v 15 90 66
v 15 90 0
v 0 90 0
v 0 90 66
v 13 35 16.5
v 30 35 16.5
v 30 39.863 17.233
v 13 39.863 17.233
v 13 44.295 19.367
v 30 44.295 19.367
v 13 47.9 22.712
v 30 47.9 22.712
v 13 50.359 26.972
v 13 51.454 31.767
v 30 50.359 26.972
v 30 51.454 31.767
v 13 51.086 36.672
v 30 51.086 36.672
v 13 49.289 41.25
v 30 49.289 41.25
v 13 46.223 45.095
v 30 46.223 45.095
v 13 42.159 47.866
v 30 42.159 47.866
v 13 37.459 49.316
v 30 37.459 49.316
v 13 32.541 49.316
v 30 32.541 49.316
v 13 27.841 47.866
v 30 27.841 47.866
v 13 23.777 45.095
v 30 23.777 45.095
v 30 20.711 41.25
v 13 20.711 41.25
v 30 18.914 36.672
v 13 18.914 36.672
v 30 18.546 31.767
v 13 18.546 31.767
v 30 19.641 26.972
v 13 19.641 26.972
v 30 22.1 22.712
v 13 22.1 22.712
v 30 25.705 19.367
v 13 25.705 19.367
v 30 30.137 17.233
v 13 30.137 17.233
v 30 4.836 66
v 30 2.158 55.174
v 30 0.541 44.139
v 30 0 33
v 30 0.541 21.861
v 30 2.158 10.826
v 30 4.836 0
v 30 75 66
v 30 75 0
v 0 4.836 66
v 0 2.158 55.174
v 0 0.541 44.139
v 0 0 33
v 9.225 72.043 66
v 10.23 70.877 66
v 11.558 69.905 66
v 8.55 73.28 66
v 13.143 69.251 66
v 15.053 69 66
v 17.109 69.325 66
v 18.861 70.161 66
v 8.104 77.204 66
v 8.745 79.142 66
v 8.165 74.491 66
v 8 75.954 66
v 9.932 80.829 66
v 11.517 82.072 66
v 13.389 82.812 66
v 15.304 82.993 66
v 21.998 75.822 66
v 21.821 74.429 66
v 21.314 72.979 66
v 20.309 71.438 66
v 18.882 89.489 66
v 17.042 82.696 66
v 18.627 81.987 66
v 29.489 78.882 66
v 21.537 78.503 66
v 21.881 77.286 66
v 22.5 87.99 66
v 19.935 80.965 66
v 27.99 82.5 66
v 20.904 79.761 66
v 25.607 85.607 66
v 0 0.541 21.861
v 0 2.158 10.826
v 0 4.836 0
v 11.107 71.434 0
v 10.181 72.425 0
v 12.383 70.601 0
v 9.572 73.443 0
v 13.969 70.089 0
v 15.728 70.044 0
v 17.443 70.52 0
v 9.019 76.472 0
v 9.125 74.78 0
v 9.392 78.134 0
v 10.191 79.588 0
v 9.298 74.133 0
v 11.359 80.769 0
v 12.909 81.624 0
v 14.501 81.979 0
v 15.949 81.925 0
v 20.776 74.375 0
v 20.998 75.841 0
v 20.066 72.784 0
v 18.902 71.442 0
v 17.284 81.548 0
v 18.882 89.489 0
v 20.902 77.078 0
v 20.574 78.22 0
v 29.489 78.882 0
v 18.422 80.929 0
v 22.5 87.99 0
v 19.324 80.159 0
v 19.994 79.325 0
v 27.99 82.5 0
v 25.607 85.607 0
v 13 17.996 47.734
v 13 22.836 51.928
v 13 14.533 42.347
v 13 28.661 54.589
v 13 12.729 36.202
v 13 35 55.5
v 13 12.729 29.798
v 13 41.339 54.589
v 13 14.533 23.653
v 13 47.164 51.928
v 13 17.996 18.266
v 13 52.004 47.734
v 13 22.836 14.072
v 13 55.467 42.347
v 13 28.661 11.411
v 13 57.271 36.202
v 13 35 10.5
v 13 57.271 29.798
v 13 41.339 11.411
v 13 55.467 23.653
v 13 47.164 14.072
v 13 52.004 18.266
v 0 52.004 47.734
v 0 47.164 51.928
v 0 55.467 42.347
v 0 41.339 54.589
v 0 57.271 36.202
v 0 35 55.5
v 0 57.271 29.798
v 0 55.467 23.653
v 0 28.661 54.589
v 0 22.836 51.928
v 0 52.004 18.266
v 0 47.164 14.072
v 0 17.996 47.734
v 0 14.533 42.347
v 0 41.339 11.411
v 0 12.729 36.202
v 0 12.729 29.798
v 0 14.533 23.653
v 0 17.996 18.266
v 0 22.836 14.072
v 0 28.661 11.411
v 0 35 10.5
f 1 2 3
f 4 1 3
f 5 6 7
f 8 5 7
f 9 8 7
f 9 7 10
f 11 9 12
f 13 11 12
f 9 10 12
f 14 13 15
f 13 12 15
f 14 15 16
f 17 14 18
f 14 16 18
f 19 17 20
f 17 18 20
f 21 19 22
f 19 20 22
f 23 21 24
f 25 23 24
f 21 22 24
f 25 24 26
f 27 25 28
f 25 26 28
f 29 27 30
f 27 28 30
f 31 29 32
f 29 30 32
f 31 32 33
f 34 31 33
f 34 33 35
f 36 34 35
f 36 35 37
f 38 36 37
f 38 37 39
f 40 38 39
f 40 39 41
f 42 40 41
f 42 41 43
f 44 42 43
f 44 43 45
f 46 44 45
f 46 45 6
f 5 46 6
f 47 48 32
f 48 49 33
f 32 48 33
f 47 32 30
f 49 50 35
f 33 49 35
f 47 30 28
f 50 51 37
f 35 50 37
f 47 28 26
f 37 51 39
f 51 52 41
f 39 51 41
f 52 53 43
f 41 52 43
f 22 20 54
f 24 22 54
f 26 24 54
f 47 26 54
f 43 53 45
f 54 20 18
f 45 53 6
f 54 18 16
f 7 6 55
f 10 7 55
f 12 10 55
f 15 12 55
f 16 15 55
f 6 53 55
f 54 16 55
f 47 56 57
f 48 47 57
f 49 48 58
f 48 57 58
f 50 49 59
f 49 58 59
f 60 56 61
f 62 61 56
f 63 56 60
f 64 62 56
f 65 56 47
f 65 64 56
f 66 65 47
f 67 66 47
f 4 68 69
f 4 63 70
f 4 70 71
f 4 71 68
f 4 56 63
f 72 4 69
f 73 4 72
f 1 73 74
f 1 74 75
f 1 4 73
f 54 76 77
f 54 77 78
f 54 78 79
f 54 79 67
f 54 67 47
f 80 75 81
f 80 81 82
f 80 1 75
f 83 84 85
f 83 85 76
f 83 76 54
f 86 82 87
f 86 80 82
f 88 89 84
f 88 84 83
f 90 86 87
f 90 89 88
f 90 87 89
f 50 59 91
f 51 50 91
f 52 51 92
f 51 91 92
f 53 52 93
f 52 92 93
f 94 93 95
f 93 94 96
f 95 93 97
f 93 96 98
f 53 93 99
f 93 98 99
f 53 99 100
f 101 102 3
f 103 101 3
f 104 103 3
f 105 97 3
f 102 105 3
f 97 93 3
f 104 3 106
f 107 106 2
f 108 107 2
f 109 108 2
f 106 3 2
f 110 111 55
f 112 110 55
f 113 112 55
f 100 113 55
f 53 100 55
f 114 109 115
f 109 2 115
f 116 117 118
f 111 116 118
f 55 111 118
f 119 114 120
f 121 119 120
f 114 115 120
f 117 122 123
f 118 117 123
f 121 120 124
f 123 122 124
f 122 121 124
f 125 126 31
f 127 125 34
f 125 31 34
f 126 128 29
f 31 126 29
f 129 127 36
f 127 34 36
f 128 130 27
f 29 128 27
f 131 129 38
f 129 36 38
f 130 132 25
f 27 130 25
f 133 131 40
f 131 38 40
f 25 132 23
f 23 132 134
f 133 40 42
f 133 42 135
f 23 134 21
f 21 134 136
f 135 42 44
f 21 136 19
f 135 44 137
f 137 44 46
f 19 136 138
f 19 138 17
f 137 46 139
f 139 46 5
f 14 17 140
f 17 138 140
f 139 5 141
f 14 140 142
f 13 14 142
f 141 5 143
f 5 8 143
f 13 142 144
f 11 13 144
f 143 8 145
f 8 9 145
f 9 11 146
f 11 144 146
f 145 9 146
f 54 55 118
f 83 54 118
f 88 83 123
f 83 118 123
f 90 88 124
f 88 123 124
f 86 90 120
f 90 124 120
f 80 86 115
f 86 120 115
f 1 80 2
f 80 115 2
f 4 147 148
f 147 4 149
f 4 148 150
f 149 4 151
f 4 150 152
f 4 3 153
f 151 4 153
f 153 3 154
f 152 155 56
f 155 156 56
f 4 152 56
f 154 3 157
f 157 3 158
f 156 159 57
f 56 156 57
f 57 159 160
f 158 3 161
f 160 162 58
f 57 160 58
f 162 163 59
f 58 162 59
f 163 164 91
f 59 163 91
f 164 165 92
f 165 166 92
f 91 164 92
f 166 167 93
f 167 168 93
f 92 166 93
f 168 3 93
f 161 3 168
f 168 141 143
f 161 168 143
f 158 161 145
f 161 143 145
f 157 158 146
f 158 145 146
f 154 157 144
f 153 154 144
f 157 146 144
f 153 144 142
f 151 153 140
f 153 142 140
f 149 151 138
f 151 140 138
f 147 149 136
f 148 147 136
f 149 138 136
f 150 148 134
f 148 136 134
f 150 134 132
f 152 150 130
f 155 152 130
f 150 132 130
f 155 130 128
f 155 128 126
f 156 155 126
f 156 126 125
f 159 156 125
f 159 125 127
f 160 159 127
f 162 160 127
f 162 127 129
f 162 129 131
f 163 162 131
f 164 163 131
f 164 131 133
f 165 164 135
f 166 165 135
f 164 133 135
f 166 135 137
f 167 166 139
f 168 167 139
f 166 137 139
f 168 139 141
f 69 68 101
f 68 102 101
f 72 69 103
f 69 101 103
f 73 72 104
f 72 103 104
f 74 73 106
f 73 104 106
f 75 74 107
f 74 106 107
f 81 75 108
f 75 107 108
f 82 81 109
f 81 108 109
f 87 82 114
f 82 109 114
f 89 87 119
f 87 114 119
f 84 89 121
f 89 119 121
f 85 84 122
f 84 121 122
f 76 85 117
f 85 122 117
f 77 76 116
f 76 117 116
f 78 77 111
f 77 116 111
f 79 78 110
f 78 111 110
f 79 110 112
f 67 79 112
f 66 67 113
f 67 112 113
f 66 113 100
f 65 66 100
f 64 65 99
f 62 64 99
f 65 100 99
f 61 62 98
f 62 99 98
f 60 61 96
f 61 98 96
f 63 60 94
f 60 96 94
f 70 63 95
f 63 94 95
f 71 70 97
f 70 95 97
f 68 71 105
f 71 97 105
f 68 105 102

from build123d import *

# Parameters (mm, degrees)
BOSS_EXTRUDE1_DEPTH = 66
CUT_EXTRUDE2_START  = -17
SKETCH3_R           = 22.5
SKETCH3_R_2         = 16.5
CUT_EXTRUDE2_DEPTH  = 13
CUT_EXTRUDE3_REACH  = 117.568
SKETCH3_2_R         = 16.5
CUT_EXTRUDE5_DEPTH  = 116.568161866


with BuildPart() as part:
    # Sketch1 → Boss-Extrude1 (new body)
    with BuildSketch(Plane.XY):
        with BuildLine():
            Line((0, 0), (30, 0))
            Line((30, 0), (30, 75))
            ThreePointArc((30, 75), (25.606601718, 85.606601718), (15, 90))
            Line((15, 90), (0, 90))
            Line((0, 90), (0, 0))
        make_face()
    extrude(amount=BOSS_EXTRUDE1_DEPTH)

    # Sketch3 → Cut-Extrude2 (cut)
    with BuildSketch(Plane(origin=(30, 0, 0), x_dir=(0, 0, -1), z_dir=(1, 0, 0)).offset(CUT_EXTRUDE2_START)):
        with Locations((-33, 35)):
            Circle(SKETCH3_R)
        with Locations((-33, 35)):
            Circle(SKETCH3_R_2, mode=Mode.SUBTRACT)
    extrude(amount=-CUT_EXTRUDE2_DEPTH, mode=Mode.SUBTRACT)

    # Sketch3<2> → Cut-Extrude3 (cut, up to next)
    with BuildSketch(Plane(origin=(30, 0, 0), x_dir=(0, 0, -1), z_dir=(1, 0, 0)), mode=Mode.PRIVATE) as cut_extrude3_sk1:
        with Locations((-33, 35)):
            Circle(SKETCH3_2_R)
    cut_extrude3_tool1 = extrude(cut_extrude3_sk1.sketch, amount=-CUT_EXTRUDE3_REACH, mode=Mode.PRIVATE) & part.part
    add(cut_extrude3_tool1.solids().sort_by_distance((30, 35, 33))[0], mode=Mode.SUBTRACT)

    # Cut-Loft1: read off the stored shape, not the designer's step
    # Cut-Loft1: loft between two sections, ruled curve by curve
    cut_loft1_from = [
        Edge.make_bspline([(8.104234717, 77.203503702, 66), (10.511242121, 90.995034268, 66), (24.302772687, 88.588026864, 66), (21.895765283, 74.796496298, 66), (19.488757879, 61.004965732, 66), (5.697227313, 63.411973136, 66), (8.104234717, 77.203503702, 66)], [0, 0, 0, 0, 0.5, 0.5, 0.5, 1, 1, 1, 1], 3, [1, 0.333333333, 0.333333333, 1, 0.333333333, 0.333333333, 1]),
    ]
    cut_loft1_to = [
        Edge.make_bspline([(9.125428786, 74.779584885, 0), (6.684598557, 86.528727313, 0), (18.433740984, 88.969557543, 0), (20.874571214, 77.220415115, 0), (23.315401443, 65.471272687, 0), (11.566259016, 63.030442457, 0), (9.125428786, 74.779584885, 0)], [0, 0, 0, 0, 0.5, 0.5, 0.5, 1, 1, 1, 1], 3, [1, 0.333333333, 0.333333333, 1, 0.333333333, 0.333333333, 1]),
    ]
    cut_loft1 = Solid(Shell([*[Face.make_surface_from_curves(cut_loft1_from[k], cut_loft1_to[k]) for k in range(1)], Face(Wire(cut_loft1_from)), Face(Wire(cut_loft1_to))]))
    add(cut_loft1, mode=Mode.SUBTRACT)

    # Sketch8 → Cut-Extrude5 (cut, through all)
    with BuildSketch(Plane.ZY):
        with BuildLine():
            ThreePointArc((33.000000237, 0), (16.323732633, 1.215545408), (0, 4.836485169))
            Line((0, 4.836485169), (0, 0))
            Line((0, 0), (33.000000237, 0))
        make_face()
        with BuildLine():
            ThreePointArc((66, 4.836485169), (49.676267601, 1.215545443), (33.000000237, 0))
            Line((33.000000237, 0), (66, 0))
            Line((66, 0), (66, 4.836485169))
        make_face()
    extrude(amount=-CUT_EXTRUDE5_DEPTH, mode=Mode.SUBTRACT)


solid = part.part
